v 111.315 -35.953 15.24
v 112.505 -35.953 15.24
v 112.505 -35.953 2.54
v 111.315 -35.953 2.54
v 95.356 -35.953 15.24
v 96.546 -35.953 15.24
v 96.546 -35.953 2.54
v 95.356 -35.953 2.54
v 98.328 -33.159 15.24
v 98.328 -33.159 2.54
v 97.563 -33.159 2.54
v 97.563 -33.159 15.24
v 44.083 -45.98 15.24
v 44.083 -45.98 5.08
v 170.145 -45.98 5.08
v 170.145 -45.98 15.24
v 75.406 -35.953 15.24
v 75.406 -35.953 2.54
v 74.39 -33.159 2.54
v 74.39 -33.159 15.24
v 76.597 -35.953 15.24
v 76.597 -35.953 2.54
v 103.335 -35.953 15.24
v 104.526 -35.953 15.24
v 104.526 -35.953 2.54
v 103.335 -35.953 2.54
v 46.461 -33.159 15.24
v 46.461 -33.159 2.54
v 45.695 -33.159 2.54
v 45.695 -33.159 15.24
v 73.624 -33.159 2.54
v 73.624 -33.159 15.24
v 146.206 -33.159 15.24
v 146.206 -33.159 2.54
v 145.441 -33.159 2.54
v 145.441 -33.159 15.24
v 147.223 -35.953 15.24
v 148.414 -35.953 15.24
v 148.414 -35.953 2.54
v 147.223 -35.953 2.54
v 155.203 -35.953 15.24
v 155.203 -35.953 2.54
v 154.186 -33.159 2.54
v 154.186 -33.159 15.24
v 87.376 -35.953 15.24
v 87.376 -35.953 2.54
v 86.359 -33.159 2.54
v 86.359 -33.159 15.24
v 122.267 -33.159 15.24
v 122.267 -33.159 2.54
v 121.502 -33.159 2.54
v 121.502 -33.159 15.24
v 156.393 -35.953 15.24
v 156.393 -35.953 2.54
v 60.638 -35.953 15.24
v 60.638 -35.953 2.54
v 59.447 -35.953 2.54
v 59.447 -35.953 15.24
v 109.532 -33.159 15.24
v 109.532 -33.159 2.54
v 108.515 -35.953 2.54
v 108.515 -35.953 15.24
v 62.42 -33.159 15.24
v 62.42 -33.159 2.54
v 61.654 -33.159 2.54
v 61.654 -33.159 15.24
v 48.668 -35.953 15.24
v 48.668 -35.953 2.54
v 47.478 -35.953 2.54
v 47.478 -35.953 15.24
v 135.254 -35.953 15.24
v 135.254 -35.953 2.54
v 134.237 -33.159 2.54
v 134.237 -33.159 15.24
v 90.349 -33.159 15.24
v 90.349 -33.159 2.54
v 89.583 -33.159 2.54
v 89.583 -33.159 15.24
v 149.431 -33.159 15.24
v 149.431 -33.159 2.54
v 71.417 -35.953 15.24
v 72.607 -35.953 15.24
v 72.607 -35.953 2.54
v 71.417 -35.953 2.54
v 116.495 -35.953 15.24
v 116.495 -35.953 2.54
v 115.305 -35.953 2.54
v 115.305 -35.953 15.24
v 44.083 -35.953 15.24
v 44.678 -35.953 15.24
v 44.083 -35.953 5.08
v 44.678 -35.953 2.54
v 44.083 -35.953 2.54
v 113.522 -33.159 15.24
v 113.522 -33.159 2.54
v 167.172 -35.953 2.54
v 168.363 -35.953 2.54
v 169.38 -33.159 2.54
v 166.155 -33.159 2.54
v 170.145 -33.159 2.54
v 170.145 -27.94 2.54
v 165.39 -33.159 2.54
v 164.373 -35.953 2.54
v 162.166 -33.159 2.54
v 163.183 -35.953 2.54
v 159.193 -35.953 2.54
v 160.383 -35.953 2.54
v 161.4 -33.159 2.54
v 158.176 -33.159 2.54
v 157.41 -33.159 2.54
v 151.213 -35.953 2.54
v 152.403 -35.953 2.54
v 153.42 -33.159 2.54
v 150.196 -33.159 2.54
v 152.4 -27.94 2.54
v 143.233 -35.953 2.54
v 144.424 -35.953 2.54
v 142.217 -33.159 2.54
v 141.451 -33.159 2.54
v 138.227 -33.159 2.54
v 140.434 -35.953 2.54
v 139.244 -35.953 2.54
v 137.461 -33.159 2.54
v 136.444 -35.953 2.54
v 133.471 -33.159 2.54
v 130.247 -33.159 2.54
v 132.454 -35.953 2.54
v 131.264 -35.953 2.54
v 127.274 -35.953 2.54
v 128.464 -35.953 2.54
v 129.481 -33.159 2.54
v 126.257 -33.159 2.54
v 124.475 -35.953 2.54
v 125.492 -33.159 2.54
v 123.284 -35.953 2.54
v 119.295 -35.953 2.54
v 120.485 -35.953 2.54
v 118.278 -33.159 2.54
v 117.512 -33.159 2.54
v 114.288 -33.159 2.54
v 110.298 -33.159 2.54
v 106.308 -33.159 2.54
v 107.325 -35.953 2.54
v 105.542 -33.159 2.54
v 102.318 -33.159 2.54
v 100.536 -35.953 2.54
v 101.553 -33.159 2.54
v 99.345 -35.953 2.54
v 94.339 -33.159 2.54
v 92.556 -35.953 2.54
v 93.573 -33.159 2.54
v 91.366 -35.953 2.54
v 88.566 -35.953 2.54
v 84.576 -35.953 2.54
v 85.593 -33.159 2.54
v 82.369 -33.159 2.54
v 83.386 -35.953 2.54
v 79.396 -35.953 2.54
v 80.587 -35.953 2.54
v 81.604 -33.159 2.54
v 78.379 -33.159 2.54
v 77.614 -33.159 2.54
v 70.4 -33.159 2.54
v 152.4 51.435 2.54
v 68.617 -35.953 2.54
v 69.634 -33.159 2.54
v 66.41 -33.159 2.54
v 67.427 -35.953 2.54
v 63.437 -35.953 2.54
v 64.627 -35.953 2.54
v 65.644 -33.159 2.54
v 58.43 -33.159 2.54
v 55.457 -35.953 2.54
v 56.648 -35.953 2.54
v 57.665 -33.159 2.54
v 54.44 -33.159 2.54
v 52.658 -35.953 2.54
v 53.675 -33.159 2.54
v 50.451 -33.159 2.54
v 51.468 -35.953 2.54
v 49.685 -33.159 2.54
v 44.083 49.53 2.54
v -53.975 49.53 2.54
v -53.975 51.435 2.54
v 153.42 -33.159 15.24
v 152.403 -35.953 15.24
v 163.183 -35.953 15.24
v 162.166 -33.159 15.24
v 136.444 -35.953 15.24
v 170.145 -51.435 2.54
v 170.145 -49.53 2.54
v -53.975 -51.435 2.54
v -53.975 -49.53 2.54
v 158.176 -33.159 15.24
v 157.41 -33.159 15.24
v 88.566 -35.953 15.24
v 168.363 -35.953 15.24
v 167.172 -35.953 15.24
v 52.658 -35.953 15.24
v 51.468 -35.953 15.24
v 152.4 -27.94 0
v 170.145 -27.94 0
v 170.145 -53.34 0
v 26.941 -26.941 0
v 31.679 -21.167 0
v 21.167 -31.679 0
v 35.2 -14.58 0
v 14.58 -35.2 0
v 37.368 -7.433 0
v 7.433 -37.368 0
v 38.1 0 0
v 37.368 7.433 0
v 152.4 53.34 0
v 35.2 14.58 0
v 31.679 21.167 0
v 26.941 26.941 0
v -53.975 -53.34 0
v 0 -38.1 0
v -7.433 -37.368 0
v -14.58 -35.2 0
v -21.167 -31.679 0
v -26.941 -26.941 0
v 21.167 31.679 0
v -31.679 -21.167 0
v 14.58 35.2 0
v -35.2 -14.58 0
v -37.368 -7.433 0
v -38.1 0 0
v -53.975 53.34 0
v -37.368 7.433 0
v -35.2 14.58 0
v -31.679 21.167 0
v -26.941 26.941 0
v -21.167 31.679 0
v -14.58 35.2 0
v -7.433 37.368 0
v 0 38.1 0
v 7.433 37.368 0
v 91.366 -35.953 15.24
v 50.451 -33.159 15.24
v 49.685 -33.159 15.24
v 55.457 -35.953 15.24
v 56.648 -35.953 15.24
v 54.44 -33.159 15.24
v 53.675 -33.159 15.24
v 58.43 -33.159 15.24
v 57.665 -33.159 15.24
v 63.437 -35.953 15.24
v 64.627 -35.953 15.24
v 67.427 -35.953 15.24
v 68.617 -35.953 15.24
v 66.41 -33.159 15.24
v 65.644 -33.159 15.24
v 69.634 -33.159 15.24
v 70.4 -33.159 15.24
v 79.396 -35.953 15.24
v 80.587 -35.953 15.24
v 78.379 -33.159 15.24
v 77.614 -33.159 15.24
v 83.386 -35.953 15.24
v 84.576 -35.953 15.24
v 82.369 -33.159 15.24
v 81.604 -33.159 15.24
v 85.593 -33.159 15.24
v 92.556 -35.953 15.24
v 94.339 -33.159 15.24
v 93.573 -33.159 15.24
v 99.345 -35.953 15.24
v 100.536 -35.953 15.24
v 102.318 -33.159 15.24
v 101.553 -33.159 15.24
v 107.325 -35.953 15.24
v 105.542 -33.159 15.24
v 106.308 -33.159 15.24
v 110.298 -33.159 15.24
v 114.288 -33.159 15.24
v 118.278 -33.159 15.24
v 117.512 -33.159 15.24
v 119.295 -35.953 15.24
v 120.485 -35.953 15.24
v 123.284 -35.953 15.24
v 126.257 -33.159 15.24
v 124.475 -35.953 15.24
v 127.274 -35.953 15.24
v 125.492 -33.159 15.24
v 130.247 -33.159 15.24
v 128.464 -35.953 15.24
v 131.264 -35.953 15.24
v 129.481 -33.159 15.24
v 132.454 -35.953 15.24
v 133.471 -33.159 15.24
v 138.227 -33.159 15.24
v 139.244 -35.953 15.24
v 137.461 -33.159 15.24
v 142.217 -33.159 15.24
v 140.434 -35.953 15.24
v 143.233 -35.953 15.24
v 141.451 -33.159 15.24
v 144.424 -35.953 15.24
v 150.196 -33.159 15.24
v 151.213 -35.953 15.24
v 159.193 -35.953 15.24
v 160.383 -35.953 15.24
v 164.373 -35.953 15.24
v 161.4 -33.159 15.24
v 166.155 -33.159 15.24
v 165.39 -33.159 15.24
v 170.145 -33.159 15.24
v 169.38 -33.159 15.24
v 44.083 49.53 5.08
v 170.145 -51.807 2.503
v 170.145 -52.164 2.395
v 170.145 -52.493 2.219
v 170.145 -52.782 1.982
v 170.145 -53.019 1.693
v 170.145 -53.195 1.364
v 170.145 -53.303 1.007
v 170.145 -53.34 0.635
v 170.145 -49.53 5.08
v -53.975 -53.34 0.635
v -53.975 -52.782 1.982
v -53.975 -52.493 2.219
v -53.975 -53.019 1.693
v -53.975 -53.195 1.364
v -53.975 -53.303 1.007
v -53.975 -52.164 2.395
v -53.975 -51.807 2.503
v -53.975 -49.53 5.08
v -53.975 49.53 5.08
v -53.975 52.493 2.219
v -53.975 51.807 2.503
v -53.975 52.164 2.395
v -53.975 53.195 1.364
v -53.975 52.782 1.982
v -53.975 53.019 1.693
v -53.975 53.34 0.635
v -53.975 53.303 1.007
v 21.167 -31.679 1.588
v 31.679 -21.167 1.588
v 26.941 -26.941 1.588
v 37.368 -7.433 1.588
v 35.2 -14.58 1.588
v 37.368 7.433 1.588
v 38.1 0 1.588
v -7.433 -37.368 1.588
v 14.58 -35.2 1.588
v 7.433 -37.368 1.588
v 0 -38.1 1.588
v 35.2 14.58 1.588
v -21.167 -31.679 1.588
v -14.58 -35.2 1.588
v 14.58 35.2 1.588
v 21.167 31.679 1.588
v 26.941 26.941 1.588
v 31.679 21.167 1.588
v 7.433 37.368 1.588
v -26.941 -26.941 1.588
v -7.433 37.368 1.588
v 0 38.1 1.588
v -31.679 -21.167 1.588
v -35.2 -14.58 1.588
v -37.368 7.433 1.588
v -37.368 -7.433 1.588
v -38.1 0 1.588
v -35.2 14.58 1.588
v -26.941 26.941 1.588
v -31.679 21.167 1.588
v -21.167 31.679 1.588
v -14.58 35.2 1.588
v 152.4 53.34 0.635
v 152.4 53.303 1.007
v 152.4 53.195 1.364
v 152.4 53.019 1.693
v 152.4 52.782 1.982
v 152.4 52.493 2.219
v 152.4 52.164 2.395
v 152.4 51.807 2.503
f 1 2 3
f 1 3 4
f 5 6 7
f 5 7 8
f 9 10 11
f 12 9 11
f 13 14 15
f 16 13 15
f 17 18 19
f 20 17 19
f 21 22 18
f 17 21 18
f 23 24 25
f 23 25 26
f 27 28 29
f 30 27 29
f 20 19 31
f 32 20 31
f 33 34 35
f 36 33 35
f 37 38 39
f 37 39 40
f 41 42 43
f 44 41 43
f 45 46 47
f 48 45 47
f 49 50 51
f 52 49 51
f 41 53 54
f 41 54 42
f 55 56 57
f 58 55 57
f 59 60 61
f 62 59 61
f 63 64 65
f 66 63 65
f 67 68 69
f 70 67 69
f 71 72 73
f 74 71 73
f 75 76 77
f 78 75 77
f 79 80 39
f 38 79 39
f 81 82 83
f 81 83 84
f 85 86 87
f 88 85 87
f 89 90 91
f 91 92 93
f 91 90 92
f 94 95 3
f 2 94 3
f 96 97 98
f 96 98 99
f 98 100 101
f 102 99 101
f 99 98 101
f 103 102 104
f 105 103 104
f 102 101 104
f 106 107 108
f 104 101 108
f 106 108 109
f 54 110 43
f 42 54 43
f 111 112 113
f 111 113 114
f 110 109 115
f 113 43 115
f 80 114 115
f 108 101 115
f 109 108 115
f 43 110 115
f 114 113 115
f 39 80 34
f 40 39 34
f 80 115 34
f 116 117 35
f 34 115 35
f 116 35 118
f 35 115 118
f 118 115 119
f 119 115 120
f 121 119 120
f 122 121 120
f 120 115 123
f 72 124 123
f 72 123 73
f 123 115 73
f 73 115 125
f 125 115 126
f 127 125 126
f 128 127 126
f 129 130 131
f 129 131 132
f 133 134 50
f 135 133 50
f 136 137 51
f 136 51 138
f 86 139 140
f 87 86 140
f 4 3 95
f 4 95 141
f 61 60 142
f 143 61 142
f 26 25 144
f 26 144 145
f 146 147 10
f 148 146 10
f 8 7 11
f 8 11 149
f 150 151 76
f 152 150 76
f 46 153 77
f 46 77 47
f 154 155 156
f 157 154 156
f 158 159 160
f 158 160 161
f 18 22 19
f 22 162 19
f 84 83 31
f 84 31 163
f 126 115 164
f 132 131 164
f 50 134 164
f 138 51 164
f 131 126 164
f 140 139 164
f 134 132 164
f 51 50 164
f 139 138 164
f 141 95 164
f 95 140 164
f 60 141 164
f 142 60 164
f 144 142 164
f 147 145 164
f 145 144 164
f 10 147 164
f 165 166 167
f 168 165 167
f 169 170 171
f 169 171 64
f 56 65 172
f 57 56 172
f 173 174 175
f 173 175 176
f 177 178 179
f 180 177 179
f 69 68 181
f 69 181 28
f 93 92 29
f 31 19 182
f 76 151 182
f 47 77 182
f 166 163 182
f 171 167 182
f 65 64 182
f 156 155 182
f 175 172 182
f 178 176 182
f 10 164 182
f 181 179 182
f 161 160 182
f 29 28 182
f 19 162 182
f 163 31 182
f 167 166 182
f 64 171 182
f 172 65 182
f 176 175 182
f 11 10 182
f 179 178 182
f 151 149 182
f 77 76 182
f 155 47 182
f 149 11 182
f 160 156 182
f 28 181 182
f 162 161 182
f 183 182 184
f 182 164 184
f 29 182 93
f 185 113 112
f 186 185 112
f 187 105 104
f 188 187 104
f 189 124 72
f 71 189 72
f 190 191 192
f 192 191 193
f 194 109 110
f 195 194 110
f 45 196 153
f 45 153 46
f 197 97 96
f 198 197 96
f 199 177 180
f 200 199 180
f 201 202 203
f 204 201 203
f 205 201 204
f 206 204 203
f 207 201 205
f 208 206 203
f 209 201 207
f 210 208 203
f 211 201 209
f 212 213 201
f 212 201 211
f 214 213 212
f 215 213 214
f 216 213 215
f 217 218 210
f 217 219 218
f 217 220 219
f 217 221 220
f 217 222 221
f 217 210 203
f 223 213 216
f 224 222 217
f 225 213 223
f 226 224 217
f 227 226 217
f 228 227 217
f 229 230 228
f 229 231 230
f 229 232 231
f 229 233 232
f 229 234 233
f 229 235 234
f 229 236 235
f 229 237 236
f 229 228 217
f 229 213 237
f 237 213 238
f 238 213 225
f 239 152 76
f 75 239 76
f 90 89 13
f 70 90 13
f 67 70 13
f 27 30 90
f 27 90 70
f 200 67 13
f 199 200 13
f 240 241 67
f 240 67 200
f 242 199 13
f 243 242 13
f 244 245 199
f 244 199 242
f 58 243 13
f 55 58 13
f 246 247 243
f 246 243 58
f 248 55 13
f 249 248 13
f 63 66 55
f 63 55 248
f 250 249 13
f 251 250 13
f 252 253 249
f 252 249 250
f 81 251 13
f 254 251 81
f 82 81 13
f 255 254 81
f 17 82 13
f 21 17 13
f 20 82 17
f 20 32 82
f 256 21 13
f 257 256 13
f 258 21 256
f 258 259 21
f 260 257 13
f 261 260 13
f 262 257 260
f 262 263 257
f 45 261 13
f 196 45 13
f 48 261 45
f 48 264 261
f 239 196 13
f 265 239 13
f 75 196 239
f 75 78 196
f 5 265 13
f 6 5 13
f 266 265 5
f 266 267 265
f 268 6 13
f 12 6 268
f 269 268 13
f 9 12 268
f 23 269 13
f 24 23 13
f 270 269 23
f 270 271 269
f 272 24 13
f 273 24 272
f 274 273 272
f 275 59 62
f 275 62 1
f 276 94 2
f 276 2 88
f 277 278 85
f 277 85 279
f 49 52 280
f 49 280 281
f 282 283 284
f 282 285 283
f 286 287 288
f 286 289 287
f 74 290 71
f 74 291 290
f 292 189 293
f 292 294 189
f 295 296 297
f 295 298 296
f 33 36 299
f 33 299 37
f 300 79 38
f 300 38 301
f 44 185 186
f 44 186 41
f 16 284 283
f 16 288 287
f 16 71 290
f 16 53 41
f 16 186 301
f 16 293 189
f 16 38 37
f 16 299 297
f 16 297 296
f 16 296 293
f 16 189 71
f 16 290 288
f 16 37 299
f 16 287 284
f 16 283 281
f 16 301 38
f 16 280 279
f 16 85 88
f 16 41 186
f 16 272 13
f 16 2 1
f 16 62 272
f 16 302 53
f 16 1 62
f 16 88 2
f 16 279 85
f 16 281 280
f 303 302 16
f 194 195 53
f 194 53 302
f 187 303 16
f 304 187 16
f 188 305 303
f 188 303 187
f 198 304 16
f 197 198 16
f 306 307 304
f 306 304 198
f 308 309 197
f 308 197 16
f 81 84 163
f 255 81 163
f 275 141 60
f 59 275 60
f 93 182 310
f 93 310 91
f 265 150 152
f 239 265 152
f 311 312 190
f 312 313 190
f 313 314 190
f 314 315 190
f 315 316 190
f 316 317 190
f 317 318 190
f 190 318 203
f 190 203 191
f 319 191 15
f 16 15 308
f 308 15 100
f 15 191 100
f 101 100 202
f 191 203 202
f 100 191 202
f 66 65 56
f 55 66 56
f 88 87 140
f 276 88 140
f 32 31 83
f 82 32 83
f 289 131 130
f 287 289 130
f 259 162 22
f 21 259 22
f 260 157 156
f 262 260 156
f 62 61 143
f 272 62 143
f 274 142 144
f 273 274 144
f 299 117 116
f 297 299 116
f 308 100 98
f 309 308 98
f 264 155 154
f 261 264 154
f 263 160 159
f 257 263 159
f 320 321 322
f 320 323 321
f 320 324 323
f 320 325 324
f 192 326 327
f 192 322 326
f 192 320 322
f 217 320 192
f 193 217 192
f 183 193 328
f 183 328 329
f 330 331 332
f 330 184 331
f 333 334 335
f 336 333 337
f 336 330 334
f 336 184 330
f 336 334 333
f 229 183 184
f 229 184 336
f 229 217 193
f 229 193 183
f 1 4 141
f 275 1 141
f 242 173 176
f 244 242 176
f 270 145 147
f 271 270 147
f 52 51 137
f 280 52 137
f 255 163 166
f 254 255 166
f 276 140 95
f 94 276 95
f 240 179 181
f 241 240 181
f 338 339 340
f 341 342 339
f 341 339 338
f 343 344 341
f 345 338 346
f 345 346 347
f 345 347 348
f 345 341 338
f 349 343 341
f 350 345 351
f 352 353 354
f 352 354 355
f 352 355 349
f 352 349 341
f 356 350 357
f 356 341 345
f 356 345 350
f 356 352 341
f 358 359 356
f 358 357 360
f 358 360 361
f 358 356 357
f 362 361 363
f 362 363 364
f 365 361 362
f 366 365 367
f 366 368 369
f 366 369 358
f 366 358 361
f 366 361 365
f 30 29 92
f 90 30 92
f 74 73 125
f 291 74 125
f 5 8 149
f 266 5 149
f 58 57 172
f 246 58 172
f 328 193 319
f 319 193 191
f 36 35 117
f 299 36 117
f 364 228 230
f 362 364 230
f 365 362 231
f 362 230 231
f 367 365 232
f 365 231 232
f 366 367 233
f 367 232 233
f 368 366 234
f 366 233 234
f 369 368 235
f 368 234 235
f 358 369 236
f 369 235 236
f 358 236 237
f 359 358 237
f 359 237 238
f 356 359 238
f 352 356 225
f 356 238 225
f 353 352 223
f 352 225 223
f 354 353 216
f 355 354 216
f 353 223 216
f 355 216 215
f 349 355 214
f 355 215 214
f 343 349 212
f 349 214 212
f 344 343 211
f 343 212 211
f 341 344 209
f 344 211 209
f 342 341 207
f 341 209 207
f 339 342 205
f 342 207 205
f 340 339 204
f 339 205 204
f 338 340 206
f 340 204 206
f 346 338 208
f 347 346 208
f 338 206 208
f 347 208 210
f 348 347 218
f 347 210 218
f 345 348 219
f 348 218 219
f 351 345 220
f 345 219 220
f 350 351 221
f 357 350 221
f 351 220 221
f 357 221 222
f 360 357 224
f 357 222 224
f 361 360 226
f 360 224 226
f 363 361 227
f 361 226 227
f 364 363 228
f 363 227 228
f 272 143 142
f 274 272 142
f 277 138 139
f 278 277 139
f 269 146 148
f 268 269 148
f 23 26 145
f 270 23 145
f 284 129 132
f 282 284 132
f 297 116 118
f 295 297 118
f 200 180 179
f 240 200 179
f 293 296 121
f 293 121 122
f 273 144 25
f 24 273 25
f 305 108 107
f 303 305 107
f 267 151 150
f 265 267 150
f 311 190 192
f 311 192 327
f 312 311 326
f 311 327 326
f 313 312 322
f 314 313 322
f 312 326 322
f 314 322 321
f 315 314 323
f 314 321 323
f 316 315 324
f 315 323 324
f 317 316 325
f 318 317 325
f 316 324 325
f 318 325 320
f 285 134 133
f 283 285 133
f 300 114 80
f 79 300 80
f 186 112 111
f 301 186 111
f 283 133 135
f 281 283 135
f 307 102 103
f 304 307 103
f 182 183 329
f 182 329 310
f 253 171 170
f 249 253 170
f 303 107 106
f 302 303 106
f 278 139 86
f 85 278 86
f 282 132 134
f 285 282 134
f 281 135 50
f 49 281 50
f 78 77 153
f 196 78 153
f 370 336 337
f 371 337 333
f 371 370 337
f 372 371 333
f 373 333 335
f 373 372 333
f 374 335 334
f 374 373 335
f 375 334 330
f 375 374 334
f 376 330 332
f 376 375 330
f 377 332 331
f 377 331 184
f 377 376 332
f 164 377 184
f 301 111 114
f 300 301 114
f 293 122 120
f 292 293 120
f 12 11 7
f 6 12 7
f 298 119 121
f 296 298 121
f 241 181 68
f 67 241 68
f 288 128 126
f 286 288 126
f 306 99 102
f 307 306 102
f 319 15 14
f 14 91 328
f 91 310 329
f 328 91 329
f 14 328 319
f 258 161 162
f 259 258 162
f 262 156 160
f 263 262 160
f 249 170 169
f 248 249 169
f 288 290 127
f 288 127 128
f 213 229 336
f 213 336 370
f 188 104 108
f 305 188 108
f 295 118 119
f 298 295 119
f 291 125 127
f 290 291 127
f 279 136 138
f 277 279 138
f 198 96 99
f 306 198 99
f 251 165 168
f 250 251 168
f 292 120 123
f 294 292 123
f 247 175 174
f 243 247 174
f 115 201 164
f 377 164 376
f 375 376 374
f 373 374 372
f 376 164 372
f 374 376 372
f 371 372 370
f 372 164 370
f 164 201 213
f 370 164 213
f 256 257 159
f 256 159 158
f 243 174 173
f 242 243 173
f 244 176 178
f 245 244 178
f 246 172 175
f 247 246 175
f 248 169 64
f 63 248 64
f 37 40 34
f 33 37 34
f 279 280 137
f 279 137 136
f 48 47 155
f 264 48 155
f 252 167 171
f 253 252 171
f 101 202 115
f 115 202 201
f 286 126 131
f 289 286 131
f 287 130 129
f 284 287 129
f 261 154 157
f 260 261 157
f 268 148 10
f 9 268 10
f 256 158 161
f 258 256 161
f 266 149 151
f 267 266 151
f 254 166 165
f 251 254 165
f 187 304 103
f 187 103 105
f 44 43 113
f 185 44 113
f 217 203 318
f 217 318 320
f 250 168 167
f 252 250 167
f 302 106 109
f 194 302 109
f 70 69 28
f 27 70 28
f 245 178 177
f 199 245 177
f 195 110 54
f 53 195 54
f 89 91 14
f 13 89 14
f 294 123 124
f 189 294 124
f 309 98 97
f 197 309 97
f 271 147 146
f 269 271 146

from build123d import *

# Parameters (mm, degrees)
SKETCH1_W           = 206.375
SKETCH1_H           = 106.68
BOSS_EXTRUDE1_DEPTH = 2.54
BOSS_EXTRUDE2_DEPTH = 12.7
SKETCH3_W           = 17.745286293
SKETCH3_H           = 25.4
BOSS_EXTRUDE3_DEPTH = 2.54
FILLET1_R           = 1.905
BOSS_EXTRUDE4_DEPTH = 2.54
SKETCH6_R           = 38.1
CUT_EXTRUDE1_DEPTH  = 1.5875


with BuildPart() as part:
    # Sketch1 → Boss-Extrude1 (new body)
    with BuildSketch(Plane.XY):
        with Locations((49.2125, 0)):
            Rectangle(SKETCH1_W, SKETCH1_H)
    extrude(amount=BOSS_EXTRUDE1_DEPTH)

    # Sketch2 → Boss-Extrude2 (add)
    with BuildSketch(Plane.XY.offset(2.54)):
        Polygon((170.145286293, -33.159030477), (169.379659355, -33.159030477), (168.362726521, -35.953030477), (167.172396462, -35.953030477), (166.155463627, -33.159030477), (165.38983669, -33.159030477), (164.372903855, -35.953030477), (163.182573796, -35.953030477), (162.165640962, -33.159030477), (161.400014024, -33.159030477), (160.38308119, -35.953030477), (159.192751131, -35.953030477), (158.175818296, -33.159030477), (157.410191359, -33.159030477), (156.393258524, -35.953030477), (155.202928465, -35.953030477), (154.185995631, -33.159030477), (153.420368693, -33.159030477), (152.403435859, -35.953030477), (151.2131058, -35.953030477), (150.196172965, -33.159030477), (149.430546028, -33.159030477), (148.413613193, -35.953030477), (147.223283134, -35.953030477), (146.2063503, -33.159030477), (145.440723362, -33.159030477), (144.423790528, -35.953030477), (143.233460469, -35.953030477), (142.216527634, -33.159030477), (141.450900697, -33.159030477), (140.433967862, -35.953030477), (139.243637803, -35.953030477), (138.226704969, -33.159030477), (137.461078031, -33.159030477), (136.444145197, -35.953030477), (135.253815138, -35.953030477), (134.236882303, -33.159030477), (133.471255366, -33.159030477), (132.454322531, -35.953030477), (131.263992472, -35.953030477), (130.247059638, -33.159030477), (129.4814327, -33.159030477), (128.464499866, -35.953030477), (127.274169807, -35.953030477), (126.257236972, -33.159030477), (125.491610035, -33.159030477), (124.4746772, -35.953030477), (123.284347141, -35.953030477), (122.267414307, -33.159030477), (121.501787369, -33.159030477), (120.484854535, -35.953030477), (119.294524476, -35.953030477), (118.277591641, -33.159030477), (117.511964704, -33.159030477), (116.495031869, -35.953030477), (115.30470181, -35.953030477), (114.287768976, -33.159030477), (113.522142038, -33.159030477), (112.505209204, -35.953030477), (111.314879145, -35.953030477), (110.29794631, -33.159030477), (109.532319373, -33.159030477), (108.515386538, -35.953030477), (107.325056479, -35.953030477), (106.308123645, -33.159030477), (105.542496707, -33.159030477), (104.525563873, -35.953030477), (103.335233814, -35.953030477), (102.318300979, -33.159030477), (101.552674042, -33.159030477), (100.535741207, -35.953030477), (99.345411148, -35.953030477), (98.328478314, -33.159030477), (97.562851376, -33.159030477), (96.545918542, -35.953030477), (95.355588483, -35.953030477), (94.338655648, -33.159030477), (93.573028711, -33.159030477), (92.556095876, -35.953030477), (91.365765817, -35.953030477), (90.348832983, -33.159030477), (89.583206045, -33.159030477), (88.566273211, -35.953030477), (87.375943152, -35.953030477), (86.359010317, -33.159030477), (85.59338338, -33.159030477), (84.576450545, -35.953030477), (83.386120486, -35.953030477), (82.369187652, -33.159030477), (81.603560714, -33.159030477), (80.58662788, -35.953030477), (79.396297821, -35.953030477), (78.379364986, -33.159030477), (77.613738049, -33.159030477), (76.596805214, -35.953030477), (75.406475155, -35.953030477), (74.389542321, -33.159030477), (73.623915383, -33.159030477), (72.606982549, -35.953030477), (71.41665249, -35.953030477), (70.399719655, -33.159030477), (69.634092718, -33.159030477), (68.617159883, -35.953030477), (67.426829824, -35.953030477), (66.40989699, -33.159030477), (65.644270052, -33.159030477), (64.627337218, -35.953030477), (63.437007159, -35.953030477), (62.420074324, -33.159030477), (61.654447387, -33.159030477), (60.637514552, -35.953030477), (59.447184493, -35.953030477), (58.430251659, -33.159030477), (57.664624721, -33.159030477), (56.647691887, -35.953030477), (55.457361828, -35.953030477), (54.440428993, -33.159030477), (53.674802056, -33.159030477), (52.657869221, -35.953030477), (51.467539162, -35.953030477), (50.450606328, -33.159030477), (49.68497939, -33.159030477), (48.668046556, -35.953030477), (47.477716497, -35.953030477), (46.460783662, -33.159030477), (45.695156725, -33.159030477), (44.67822389, -35.953030477), (44.083058861, -35.953030477), (44.083058861, -45.979871745), (170.145286293, -45.979871745), align=None)
    extrude(amount=BOSS_EXTRUDE2_DEPTH)

    # Sketch3 → Boss-Extrude3 (add)
    with BuildSketch(Plane(origin=(0, 0, 0), x_dir=(-1, 0, 0), z_dir=(0, 0, -1))):
        with Locations((-161.272643147, -40.64)):
            Rectangle(SKETCH3_W, SKETCH3_H)
    extrude(amount=-BOSS_EXTRUDE3_DEPTH)

    # Fillet1
    fillet1_edges = [part.edges().sort_by_distance(p)[0] for p in [
        (58.085143146, -53.34, 2.54),
        (49.2125, 53.34, 2.54),
    ]]
    fillet(fillet1_edges, radius=FILLET1_R)

    # Sketch5 → Boss-Extrude4 (add)
    with BuildSketch(Plane.XY.offset(2.54)):
        Polygon((-53.975, 49.53), (44.083058861, 49.53), (44.083058861, -45.979871745), (170.145286293, -45.979871745), (170.145286293, -49.53), (44.083058861, -49.53), (-53.975, -49.53), align=None)
    extrude(amount=BOSS_EXTRUDE4_DEPTH)

    # Sketch6 → Cut-Extrude1 (cut)
    with BuildSketch(Plane(origin=(0, 0, 0), x_dir=(-1, 0, 0), z_dir=(0, 0, -1))):
        Circle(SKETCH6_R)
    extrude(amount=-CUT_EXTRUDE1_DEPTH, mode=Mode.SUBTRACT)


solid = part.part
